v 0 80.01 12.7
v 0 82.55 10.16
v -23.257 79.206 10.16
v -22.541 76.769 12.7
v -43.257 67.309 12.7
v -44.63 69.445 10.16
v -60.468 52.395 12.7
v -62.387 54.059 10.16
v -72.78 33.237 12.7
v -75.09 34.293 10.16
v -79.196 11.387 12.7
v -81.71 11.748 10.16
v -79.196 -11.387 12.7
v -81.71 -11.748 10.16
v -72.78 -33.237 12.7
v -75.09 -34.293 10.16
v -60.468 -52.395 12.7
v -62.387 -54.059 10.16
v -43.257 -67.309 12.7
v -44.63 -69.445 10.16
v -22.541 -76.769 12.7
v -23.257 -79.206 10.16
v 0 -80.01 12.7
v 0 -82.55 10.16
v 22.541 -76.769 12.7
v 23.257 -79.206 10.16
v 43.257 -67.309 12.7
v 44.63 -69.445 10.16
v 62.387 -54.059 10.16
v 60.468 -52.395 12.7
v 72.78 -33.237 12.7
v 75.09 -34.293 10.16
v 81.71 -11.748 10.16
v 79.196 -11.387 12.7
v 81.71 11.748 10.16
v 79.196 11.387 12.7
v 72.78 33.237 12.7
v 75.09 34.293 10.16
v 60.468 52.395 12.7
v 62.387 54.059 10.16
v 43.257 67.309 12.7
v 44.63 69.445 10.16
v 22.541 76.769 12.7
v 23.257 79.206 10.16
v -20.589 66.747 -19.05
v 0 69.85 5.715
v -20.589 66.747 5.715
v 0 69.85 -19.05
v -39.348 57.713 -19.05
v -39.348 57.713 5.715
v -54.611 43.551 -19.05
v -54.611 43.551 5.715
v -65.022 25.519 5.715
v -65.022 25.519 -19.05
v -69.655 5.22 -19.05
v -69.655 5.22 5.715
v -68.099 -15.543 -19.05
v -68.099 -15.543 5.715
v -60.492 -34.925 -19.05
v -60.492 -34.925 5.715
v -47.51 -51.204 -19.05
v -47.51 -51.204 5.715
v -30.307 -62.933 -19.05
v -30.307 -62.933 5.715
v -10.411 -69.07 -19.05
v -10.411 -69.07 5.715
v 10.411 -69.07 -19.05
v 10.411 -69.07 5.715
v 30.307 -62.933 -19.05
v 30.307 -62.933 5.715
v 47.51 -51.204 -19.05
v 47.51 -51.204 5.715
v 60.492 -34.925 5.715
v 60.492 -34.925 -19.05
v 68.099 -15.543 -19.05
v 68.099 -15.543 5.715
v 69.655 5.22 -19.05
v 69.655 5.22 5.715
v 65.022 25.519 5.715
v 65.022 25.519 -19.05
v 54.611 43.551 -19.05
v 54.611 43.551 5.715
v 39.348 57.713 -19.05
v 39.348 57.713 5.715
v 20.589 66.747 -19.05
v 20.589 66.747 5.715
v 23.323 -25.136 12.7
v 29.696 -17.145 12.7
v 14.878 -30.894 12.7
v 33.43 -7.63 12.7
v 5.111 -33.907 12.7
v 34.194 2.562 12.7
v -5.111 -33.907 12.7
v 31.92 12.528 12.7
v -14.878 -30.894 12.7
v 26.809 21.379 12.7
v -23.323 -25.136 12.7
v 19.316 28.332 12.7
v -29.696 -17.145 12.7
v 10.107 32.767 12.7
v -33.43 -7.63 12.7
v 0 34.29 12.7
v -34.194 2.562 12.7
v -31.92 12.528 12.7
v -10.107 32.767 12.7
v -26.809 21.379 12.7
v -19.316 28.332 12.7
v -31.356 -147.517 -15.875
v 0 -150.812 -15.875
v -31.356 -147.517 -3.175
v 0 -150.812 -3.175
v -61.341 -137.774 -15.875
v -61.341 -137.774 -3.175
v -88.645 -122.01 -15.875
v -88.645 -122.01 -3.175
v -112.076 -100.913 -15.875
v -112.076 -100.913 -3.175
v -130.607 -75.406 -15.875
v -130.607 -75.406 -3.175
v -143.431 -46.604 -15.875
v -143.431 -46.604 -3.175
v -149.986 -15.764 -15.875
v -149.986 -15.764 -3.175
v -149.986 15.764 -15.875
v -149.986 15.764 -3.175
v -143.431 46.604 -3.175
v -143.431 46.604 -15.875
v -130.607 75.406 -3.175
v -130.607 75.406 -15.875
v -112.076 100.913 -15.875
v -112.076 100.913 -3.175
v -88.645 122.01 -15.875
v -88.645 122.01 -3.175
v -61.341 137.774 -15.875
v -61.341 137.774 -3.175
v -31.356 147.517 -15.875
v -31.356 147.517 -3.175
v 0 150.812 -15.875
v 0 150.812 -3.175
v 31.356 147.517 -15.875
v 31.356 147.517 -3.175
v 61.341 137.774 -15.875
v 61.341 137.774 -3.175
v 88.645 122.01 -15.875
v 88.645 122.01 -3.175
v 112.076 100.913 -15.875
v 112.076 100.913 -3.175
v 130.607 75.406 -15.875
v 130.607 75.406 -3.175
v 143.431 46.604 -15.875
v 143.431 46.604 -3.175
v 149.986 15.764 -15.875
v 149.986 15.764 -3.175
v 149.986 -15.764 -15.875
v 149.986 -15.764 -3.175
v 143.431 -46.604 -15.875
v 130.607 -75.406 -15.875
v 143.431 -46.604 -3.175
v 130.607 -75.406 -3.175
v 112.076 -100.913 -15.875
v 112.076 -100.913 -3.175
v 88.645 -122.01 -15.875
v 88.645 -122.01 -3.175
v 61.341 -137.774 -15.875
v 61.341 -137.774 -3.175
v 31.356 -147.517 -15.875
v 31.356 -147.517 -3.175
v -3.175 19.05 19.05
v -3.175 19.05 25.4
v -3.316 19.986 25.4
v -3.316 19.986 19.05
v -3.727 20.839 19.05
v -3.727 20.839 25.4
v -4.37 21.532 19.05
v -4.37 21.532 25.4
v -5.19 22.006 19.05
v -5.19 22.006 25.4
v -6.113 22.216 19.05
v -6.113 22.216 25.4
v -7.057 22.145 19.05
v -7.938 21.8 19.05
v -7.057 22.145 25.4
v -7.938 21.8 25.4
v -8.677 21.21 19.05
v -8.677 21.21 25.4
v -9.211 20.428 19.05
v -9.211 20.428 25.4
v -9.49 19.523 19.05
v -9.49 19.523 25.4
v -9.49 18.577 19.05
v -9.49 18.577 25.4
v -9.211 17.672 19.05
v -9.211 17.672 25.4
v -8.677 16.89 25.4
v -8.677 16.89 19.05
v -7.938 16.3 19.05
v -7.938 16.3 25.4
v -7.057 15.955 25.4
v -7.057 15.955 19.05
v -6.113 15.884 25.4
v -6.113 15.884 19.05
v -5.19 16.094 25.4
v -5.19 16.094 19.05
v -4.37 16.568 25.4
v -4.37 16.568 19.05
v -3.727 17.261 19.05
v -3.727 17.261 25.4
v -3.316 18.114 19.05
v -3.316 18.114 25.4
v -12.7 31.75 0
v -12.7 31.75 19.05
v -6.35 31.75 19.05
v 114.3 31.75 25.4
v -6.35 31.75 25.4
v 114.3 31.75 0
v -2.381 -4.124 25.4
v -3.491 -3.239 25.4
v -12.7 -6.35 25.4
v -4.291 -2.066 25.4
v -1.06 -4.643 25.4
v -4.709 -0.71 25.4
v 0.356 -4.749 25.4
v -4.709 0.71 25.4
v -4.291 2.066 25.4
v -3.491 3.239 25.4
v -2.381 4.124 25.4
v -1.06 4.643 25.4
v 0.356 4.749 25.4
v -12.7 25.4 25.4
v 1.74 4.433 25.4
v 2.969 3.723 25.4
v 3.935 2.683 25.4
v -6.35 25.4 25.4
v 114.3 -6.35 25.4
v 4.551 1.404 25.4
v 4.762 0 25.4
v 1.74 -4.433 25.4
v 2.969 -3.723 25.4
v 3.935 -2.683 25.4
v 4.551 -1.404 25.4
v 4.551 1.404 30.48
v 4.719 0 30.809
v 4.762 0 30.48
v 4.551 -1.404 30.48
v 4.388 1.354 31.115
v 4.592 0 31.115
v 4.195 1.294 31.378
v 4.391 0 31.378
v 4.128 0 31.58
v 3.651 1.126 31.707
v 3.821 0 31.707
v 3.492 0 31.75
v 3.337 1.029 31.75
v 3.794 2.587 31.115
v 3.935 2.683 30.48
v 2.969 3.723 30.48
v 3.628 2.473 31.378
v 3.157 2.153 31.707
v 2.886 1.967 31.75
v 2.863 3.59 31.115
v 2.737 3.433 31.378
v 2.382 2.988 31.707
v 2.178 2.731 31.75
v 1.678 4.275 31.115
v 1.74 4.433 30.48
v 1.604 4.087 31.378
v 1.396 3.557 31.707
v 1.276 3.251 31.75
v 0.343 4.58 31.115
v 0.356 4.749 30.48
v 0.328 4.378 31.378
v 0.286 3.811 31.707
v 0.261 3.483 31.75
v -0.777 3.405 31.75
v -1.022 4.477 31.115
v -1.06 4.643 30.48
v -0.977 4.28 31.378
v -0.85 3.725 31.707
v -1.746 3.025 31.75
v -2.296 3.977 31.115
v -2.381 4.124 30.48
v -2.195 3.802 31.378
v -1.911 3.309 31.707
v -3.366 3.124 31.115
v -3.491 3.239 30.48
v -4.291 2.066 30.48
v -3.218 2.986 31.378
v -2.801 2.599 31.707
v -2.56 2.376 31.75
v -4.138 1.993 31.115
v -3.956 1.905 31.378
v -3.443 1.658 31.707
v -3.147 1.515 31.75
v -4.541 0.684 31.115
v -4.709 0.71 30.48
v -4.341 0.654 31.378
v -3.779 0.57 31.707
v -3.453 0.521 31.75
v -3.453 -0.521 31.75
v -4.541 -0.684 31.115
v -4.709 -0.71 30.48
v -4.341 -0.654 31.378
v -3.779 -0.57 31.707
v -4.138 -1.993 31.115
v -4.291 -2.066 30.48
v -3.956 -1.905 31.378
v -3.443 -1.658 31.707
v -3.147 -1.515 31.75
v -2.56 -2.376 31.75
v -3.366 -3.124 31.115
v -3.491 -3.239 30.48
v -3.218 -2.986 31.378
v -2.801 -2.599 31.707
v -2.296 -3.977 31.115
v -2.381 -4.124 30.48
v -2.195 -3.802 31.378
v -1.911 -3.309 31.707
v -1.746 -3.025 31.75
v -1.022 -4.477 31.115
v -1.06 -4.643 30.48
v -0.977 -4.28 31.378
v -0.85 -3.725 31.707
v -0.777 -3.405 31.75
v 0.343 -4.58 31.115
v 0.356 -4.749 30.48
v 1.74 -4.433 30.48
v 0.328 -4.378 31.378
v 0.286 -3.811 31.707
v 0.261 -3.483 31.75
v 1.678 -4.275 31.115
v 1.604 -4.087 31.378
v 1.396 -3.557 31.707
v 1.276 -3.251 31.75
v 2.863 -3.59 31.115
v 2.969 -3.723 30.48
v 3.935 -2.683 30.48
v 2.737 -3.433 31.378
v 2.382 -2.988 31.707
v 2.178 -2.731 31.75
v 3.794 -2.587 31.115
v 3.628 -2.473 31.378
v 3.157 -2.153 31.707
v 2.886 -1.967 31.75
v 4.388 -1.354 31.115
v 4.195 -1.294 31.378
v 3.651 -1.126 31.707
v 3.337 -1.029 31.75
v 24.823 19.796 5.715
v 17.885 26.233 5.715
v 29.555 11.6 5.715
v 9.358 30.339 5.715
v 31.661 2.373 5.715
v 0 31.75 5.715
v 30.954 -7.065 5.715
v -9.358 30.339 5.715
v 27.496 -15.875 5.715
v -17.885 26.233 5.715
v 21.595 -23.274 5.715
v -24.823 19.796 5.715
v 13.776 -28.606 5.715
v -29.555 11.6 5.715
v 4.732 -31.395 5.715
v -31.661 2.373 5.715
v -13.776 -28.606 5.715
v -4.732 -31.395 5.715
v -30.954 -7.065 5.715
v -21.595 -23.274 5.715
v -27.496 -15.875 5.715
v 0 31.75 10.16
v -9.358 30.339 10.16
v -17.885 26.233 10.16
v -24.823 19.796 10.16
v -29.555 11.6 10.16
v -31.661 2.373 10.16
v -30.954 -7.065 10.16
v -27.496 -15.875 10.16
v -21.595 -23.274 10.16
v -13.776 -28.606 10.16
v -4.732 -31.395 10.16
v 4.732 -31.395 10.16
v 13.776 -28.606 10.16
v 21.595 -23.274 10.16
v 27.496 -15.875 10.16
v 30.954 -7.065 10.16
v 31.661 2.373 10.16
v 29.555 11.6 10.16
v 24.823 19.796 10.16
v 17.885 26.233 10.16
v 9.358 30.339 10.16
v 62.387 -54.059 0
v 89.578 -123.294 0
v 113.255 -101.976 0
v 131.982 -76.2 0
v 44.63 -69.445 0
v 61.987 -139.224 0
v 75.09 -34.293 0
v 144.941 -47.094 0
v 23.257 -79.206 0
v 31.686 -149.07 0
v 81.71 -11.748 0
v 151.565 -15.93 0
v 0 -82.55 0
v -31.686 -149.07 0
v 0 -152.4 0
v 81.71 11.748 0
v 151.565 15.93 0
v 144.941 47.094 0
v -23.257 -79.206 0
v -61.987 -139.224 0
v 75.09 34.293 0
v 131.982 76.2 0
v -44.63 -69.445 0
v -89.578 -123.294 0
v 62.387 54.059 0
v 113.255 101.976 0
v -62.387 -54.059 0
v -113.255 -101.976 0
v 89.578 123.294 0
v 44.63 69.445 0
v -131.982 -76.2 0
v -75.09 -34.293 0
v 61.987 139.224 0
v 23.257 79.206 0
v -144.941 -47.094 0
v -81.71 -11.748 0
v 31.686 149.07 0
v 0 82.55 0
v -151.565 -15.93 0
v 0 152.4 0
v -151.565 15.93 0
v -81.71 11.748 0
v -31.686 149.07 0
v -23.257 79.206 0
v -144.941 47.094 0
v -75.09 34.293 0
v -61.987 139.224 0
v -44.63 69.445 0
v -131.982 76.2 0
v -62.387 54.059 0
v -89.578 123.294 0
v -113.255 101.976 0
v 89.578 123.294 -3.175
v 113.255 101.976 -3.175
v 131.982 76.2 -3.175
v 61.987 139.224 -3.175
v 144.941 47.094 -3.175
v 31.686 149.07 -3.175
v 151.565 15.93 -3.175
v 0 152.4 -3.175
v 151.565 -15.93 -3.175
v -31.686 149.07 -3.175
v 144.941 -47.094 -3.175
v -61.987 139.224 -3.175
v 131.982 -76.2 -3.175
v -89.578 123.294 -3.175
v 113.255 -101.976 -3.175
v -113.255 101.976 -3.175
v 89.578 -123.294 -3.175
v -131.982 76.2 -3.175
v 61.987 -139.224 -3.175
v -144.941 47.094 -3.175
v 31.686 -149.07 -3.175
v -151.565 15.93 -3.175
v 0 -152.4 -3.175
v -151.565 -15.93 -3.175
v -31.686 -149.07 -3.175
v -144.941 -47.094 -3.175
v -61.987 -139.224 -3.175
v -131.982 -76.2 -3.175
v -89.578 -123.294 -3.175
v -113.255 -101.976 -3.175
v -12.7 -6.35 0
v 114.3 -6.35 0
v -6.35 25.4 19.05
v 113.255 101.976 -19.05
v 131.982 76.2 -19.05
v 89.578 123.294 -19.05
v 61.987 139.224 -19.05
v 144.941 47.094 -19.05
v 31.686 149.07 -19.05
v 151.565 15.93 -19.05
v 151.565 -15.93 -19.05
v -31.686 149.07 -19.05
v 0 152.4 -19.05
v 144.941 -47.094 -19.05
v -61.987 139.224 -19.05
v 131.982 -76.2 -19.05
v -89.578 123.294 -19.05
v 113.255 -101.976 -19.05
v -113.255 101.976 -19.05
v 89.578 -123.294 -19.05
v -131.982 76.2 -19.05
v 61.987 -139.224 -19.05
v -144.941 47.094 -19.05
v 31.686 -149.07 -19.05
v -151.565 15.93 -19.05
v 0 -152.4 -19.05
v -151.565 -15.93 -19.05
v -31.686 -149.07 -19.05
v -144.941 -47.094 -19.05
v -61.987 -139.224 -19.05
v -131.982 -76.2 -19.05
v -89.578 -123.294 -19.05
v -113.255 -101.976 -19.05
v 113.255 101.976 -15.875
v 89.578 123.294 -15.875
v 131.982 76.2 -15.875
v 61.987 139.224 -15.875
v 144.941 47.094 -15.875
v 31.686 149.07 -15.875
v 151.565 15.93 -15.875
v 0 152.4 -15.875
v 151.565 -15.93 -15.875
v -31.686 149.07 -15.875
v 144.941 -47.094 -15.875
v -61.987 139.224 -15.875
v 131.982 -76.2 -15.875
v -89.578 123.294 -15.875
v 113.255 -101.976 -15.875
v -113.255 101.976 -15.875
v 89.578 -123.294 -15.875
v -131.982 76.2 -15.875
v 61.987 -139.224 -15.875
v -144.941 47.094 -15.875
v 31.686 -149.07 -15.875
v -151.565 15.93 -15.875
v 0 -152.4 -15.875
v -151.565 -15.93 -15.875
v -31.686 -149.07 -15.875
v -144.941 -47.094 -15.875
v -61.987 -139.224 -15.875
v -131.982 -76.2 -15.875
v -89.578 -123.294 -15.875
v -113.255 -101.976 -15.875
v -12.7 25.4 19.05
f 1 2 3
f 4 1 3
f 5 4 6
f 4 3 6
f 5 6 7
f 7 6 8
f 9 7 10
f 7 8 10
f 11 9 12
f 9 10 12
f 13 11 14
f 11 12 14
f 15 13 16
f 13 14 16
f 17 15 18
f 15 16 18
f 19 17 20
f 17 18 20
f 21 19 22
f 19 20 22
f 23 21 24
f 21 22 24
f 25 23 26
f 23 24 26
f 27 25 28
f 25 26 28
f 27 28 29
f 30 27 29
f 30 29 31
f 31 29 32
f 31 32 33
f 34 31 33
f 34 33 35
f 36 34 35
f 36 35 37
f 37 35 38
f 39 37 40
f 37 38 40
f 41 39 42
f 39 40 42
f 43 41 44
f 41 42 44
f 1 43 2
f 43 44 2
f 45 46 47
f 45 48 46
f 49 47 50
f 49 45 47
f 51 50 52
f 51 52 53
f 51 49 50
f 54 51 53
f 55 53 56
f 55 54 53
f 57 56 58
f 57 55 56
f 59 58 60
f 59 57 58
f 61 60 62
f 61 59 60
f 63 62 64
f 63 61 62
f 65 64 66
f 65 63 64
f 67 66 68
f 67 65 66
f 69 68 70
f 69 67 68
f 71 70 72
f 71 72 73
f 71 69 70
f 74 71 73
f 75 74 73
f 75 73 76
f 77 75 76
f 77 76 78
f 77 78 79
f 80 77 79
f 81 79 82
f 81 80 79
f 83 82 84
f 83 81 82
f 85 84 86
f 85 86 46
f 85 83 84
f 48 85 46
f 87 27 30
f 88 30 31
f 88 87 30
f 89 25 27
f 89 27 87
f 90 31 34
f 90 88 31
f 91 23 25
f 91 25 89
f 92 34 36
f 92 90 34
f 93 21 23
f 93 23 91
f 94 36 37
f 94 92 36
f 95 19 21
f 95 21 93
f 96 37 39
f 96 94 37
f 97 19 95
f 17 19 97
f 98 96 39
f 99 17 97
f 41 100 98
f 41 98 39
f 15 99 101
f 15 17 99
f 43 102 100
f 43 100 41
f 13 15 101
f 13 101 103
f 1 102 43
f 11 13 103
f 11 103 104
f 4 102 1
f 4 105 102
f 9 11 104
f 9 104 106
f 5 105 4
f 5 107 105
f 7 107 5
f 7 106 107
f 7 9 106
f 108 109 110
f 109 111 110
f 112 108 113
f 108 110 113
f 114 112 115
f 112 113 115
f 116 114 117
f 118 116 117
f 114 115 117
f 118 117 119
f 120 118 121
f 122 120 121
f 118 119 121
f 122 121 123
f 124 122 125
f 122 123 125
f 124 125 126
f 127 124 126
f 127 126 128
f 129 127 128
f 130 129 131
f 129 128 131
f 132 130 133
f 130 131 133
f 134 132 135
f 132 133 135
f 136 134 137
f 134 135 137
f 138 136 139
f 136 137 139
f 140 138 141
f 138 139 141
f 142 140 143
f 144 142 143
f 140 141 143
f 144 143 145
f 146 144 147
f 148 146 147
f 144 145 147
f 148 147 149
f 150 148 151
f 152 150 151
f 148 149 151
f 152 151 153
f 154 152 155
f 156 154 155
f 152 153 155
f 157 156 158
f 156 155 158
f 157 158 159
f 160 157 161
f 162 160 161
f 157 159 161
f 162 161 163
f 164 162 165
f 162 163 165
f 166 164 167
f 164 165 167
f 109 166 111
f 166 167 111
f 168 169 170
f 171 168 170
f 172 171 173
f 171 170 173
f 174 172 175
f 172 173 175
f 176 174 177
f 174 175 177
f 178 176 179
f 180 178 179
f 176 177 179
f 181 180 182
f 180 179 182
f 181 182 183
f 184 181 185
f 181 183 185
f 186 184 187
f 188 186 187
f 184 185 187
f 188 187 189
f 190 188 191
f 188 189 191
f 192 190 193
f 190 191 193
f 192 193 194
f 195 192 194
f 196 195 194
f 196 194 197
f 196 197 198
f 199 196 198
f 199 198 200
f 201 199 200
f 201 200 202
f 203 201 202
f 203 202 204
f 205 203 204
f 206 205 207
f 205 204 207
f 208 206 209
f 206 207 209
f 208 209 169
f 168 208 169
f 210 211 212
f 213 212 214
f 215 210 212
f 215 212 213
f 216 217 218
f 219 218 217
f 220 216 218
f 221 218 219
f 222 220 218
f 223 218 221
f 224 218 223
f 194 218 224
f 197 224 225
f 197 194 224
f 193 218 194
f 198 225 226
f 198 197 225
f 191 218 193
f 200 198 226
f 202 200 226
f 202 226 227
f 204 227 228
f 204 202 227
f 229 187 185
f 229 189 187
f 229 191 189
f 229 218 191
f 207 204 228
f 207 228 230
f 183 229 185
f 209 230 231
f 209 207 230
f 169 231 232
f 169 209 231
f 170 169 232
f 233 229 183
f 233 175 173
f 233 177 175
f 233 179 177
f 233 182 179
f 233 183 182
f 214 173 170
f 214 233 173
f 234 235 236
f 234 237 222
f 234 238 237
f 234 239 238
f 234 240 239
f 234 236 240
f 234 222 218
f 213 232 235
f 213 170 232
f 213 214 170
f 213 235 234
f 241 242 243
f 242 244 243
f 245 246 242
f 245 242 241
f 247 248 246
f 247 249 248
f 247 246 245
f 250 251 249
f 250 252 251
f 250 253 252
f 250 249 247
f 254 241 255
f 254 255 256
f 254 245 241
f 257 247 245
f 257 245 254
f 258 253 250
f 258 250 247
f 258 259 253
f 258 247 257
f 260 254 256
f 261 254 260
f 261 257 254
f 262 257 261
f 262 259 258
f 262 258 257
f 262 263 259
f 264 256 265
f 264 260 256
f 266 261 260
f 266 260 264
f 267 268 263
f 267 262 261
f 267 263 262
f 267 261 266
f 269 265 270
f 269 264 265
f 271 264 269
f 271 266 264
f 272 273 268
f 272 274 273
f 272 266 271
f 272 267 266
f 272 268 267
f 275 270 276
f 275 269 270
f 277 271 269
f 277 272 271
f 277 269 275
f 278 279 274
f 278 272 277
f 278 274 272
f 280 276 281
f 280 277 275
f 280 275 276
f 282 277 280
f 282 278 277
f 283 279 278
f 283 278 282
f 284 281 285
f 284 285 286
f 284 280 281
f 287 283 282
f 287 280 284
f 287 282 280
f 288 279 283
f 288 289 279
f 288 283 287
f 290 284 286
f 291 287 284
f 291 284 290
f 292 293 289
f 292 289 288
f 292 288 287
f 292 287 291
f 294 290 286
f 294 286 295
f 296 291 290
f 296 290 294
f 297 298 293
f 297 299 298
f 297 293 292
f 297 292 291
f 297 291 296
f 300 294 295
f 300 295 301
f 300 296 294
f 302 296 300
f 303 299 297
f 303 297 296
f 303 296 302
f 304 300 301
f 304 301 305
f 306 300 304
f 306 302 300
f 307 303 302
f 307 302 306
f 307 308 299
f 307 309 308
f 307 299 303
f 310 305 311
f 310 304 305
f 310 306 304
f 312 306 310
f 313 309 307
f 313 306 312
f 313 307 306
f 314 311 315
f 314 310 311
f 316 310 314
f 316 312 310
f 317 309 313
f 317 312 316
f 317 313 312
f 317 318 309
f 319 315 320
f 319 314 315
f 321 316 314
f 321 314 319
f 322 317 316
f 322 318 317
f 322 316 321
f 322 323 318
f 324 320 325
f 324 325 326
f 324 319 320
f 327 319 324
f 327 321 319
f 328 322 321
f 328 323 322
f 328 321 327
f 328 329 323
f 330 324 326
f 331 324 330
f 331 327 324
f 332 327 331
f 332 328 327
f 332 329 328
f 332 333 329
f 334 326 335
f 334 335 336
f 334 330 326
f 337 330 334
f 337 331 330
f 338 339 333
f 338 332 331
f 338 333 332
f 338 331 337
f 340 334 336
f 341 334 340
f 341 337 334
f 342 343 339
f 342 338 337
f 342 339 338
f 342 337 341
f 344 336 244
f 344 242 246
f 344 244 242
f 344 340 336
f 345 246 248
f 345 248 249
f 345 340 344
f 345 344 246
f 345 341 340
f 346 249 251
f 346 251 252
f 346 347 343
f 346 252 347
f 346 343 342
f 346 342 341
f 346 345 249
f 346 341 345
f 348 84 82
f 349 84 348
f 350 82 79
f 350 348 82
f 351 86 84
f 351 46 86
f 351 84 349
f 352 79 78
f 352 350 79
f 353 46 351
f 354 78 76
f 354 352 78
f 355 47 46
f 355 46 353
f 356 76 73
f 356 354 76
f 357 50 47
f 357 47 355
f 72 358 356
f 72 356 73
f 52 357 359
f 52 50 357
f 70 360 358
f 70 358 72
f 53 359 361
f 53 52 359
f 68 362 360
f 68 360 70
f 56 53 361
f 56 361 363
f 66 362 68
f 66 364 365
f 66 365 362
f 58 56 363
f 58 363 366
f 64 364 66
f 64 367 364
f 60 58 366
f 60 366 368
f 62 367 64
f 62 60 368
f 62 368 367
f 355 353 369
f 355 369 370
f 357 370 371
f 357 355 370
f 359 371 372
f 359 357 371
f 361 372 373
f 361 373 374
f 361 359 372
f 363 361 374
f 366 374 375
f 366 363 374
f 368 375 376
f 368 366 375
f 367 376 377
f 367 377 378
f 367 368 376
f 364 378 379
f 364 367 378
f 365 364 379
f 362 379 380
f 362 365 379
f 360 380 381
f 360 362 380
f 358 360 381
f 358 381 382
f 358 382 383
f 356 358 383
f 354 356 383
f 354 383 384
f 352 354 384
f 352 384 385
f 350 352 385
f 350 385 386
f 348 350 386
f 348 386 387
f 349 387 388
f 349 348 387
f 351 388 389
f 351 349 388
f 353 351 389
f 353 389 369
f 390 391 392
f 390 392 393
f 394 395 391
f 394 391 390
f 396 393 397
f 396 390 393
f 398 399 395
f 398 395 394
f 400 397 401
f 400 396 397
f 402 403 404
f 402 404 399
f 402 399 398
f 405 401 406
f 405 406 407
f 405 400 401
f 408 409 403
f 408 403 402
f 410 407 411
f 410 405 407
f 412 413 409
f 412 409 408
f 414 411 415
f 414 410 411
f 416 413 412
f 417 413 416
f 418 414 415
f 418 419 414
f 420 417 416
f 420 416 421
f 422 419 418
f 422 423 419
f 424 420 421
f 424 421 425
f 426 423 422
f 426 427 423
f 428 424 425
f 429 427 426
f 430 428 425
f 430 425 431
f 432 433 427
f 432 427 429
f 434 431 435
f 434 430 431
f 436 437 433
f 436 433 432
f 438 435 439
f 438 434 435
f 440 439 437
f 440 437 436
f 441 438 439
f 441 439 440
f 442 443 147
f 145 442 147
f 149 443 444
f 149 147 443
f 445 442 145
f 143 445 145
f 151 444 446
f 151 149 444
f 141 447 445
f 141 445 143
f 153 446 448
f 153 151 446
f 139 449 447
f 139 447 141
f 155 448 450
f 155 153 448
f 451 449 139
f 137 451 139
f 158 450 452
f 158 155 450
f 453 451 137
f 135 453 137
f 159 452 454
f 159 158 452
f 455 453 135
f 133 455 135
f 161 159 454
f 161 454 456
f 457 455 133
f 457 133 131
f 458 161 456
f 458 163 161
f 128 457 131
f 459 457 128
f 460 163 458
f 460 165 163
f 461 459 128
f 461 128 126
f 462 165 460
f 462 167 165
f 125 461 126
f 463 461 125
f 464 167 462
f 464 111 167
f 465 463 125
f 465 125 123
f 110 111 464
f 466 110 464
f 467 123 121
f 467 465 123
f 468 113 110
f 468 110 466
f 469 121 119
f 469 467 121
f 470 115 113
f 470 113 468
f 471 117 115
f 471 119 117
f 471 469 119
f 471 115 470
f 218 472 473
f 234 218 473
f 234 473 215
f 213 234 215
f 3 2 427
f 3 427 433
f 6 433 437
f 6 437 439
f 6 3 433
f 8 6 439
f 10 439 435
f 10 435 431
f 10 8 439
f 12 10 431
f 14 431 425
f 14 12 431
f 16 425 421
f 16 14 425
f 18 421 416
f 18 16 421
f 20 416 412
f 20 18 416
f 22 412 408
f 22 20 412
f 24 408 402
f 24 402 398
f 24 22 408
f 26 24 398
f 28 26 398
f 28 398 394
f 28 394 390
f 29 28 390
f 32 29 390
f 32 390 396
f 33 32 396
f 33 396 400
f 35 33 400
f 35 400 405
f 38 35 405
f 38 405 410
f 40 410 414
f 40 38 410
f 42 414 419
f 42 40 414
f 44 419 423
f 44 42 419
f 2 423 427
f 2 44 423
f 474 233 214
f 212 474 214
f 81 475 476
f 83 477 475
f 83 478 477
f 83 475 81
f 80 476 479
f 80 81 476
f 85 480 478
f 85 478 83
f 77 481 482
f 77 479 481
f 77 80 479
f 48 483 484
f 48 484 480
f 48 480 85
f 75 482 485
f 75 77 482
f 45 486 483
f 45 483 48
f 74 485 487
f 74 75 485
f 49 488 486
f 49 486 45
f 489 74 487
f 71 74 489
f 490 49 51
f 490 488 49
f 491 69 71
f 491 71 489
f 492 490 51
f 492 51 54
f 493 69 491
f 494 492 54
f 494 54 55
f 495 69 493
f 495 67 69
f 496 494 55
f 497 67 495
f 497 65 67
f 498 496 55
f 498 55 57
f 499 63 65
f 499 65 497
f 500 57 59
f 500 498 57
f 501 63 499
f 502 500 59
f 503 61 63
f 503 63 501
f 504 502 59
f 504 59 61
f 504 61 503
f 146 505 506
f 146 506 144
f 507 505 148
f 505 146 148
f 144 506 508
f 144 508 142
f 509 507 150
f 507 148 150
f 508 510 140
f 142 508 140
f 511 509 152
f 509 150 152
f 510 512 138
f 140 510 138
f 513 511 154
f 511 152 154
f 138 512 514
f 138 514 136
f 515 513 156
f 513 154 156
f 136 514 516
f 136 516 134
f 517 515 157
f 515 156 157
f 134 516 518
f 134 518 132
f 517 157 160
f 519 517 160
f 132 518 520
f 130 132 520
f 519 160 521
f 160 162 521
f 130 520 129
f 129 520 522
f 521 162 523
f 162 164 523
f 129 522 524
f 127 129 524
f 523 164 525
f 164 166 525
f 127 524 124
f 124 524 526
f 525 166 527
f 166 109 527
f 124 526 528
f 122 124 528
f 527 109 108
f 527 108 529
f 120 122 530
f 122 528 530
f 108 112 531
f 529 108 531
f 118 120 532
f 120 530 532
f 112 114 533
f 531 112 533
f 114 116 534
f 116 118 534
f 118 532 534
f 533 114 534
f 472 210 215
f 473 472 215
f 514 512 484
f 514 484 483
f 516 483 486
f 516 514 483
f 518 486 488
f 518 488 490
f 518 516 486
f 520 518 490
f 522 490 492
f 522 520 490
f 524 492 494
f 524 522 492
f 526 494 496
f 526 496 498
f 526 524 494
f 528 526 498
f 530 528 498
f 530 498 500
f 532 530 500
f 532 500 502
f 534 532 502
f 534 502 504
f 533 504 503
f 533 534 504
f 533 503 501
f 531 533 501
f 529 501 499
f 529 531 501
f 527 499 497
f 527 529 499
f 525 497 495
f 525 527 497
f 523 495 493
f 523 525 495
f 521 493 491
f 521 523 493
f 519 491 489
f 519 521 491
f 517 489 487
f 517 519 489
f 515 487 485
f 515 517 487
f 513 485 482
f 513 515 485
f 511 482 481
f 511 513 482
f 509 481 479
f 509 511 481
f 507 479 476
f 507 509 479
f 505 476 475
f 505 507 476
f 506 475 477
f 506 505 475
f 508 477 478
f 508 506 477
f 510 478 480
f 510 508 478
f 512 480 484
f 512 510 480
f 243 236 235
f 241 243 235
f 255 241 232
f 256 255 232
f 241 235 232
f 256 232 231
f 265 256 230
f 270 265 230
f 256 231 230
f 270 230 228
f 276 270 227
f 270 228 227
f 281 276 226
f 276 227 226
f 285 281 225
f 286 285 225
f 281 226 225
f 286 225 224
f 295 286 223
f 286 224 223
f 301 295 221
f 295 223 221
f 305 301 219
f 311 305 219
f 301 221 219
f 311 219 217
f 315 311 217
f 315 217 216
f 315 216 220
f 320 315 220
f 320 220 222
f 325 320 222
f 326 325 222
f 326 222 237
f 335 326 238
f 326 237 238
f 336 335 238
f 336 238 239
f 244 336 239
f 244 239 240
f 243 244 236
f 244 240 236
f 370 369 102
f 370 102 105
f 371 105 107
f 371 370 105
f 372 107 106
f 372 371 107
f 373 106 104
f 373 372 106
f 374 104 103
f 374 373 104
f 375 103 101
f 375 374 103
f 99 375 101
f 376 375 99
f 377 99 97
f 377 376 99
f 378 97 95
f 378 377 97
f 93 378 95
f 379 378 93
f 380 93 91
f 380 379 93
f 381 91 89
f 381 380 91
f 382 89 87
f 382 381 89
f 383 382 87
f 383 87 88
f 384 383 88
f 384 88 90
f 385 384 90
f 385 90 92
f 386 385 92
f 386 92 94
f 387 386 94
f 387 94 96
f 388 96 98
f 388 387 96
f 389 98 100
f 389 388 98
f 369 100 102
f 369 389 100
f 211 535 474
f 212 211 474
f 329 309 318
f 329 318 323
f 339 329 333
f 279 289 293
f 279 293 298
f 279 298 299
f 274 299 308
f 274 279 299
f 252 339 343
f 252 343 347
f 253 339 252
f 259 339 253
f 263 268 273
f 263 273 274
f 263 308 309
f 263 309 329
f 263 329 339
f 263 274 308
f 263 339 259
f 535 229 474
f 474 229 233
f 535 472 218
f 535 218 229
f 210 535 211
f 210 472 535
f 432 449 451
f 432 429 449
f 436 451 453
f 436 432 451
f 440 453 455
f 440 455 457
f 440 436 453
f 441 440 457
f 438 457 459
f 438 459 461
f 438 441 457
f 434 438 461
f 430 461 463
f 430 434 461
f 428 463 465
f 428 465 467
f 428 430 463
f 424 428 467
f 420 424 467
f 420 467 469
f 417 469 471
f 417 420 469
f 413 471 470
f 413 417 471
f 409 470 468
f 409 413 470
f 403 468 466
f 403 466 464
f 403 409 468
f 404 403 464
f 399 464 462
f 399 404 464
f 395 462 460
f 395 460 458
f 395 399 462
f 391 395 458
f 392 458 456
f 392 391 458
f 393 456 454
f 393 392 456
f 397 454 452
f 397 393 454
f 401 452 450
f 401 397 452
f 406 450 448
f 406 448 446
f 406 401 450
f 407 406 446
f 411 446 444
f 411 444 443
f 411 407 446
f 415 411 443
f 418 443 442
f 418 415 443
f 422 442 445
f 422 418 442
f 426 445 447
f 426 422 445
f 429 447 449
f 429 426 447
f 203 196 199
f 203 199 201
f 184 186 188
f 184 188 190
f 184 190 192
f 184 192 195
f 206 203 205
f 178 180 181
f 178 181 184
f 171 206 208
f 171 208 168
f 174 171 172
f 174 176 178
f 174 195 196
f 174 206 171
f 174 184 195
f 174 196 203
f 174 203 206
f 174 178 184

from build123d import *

# Parameters (mm, degrees)
F2_SIZE   = 2.54
F3_W      = 127
F3_H      = 38.1
F4_DEPTH  = 25.4
F5_R      = 4.7625
F6_DEPTH  = 6.35
F7_W      = 6.35
F7_H      = 6.35
F8_DEPTH  = 6.35
F9_R      = 3.175
F10_DEPTH = 6.35
F11_R     = 1.27
F13_W     = 3.175
F13_H     = 12.7


# Not quite as in the source:
# - a feature names something its author has since deleted; it is built from what else it names


with BuildPart() as f1:
    # F0 (on Right) → F1 (revolve)
    with BuildSketch(Plane.YZ):
        Polygon((82.55, 12.7), (31.75, 12.7), (31.75, 5.715), (69.85, 5.715), (69.85, -19.05), (152.4, -19.05), (152.4, 0), (82.55, 0), align=None)
    revolve(axis=Axis((0, 0, 6.35), (0, 0, 1)))

    # F2
    f2_edges = [f1.edges().sort_by_distance(p)[0] for p in [
        (0, -31.75, 12.7),
        (0, -82.55, 12.7),
    ]]
    chamfer(f2_edges, length=F2_SIZE)

    # F13 (on Right) → F14 (revolve, cut)
    with BuildSketch(Plane.YZ):
        with Locations((-152.4, -9.525)):
            Rectangle(F13_W, F13_H)
    revolve(axis=Axis((0, 0, -9.525), (0, 0, -1)), mode=Mode.SUBTRACT)


with BuildPart() as f4:
    # F3 (on Top) → F4 (new body)
    with BuildSketch(Plane.XY):
        with Locations((50.8, 12.7)):
            Rectangle(F3_W, F3_H)
    extrude(amount=F4_DEPTH)

    # F5 (on face) → F6 (join)
    with BuildSketch(Plane.XY.offset(25.4)):
        Circle(F5_R)
    extrude(amount=F6_DEPTH)

    # F7 (on face) → F8 (cut)
    with BuildSketch(Plane.XY.offset(25.4)):
        with Locations((-9.525, 28.575)):
            Rectangle(F7_W, F7_H)
    extrude(amount=-F8_DEPTH, mode=Mode.SUBTRACT)

    # F9 (on face) → F10 (cut)
    with BuildSketch(Plane.XY.offset(25.4)):
        with Locations((-6.35, 19.05)):
            Circle(F9_R)
    extrude(amount=-F10_DEPTH, mode=Mode.SUBTRACT)

    # F11
    f11_edges = [f4.edges().sort_by_distance(p)[0] for p in [
        (-4.7625, 0, 31.75),
    ]]
    fillet(f11_edges, radius=F11_R)


solid = Compound([f1.part, f4.part])
